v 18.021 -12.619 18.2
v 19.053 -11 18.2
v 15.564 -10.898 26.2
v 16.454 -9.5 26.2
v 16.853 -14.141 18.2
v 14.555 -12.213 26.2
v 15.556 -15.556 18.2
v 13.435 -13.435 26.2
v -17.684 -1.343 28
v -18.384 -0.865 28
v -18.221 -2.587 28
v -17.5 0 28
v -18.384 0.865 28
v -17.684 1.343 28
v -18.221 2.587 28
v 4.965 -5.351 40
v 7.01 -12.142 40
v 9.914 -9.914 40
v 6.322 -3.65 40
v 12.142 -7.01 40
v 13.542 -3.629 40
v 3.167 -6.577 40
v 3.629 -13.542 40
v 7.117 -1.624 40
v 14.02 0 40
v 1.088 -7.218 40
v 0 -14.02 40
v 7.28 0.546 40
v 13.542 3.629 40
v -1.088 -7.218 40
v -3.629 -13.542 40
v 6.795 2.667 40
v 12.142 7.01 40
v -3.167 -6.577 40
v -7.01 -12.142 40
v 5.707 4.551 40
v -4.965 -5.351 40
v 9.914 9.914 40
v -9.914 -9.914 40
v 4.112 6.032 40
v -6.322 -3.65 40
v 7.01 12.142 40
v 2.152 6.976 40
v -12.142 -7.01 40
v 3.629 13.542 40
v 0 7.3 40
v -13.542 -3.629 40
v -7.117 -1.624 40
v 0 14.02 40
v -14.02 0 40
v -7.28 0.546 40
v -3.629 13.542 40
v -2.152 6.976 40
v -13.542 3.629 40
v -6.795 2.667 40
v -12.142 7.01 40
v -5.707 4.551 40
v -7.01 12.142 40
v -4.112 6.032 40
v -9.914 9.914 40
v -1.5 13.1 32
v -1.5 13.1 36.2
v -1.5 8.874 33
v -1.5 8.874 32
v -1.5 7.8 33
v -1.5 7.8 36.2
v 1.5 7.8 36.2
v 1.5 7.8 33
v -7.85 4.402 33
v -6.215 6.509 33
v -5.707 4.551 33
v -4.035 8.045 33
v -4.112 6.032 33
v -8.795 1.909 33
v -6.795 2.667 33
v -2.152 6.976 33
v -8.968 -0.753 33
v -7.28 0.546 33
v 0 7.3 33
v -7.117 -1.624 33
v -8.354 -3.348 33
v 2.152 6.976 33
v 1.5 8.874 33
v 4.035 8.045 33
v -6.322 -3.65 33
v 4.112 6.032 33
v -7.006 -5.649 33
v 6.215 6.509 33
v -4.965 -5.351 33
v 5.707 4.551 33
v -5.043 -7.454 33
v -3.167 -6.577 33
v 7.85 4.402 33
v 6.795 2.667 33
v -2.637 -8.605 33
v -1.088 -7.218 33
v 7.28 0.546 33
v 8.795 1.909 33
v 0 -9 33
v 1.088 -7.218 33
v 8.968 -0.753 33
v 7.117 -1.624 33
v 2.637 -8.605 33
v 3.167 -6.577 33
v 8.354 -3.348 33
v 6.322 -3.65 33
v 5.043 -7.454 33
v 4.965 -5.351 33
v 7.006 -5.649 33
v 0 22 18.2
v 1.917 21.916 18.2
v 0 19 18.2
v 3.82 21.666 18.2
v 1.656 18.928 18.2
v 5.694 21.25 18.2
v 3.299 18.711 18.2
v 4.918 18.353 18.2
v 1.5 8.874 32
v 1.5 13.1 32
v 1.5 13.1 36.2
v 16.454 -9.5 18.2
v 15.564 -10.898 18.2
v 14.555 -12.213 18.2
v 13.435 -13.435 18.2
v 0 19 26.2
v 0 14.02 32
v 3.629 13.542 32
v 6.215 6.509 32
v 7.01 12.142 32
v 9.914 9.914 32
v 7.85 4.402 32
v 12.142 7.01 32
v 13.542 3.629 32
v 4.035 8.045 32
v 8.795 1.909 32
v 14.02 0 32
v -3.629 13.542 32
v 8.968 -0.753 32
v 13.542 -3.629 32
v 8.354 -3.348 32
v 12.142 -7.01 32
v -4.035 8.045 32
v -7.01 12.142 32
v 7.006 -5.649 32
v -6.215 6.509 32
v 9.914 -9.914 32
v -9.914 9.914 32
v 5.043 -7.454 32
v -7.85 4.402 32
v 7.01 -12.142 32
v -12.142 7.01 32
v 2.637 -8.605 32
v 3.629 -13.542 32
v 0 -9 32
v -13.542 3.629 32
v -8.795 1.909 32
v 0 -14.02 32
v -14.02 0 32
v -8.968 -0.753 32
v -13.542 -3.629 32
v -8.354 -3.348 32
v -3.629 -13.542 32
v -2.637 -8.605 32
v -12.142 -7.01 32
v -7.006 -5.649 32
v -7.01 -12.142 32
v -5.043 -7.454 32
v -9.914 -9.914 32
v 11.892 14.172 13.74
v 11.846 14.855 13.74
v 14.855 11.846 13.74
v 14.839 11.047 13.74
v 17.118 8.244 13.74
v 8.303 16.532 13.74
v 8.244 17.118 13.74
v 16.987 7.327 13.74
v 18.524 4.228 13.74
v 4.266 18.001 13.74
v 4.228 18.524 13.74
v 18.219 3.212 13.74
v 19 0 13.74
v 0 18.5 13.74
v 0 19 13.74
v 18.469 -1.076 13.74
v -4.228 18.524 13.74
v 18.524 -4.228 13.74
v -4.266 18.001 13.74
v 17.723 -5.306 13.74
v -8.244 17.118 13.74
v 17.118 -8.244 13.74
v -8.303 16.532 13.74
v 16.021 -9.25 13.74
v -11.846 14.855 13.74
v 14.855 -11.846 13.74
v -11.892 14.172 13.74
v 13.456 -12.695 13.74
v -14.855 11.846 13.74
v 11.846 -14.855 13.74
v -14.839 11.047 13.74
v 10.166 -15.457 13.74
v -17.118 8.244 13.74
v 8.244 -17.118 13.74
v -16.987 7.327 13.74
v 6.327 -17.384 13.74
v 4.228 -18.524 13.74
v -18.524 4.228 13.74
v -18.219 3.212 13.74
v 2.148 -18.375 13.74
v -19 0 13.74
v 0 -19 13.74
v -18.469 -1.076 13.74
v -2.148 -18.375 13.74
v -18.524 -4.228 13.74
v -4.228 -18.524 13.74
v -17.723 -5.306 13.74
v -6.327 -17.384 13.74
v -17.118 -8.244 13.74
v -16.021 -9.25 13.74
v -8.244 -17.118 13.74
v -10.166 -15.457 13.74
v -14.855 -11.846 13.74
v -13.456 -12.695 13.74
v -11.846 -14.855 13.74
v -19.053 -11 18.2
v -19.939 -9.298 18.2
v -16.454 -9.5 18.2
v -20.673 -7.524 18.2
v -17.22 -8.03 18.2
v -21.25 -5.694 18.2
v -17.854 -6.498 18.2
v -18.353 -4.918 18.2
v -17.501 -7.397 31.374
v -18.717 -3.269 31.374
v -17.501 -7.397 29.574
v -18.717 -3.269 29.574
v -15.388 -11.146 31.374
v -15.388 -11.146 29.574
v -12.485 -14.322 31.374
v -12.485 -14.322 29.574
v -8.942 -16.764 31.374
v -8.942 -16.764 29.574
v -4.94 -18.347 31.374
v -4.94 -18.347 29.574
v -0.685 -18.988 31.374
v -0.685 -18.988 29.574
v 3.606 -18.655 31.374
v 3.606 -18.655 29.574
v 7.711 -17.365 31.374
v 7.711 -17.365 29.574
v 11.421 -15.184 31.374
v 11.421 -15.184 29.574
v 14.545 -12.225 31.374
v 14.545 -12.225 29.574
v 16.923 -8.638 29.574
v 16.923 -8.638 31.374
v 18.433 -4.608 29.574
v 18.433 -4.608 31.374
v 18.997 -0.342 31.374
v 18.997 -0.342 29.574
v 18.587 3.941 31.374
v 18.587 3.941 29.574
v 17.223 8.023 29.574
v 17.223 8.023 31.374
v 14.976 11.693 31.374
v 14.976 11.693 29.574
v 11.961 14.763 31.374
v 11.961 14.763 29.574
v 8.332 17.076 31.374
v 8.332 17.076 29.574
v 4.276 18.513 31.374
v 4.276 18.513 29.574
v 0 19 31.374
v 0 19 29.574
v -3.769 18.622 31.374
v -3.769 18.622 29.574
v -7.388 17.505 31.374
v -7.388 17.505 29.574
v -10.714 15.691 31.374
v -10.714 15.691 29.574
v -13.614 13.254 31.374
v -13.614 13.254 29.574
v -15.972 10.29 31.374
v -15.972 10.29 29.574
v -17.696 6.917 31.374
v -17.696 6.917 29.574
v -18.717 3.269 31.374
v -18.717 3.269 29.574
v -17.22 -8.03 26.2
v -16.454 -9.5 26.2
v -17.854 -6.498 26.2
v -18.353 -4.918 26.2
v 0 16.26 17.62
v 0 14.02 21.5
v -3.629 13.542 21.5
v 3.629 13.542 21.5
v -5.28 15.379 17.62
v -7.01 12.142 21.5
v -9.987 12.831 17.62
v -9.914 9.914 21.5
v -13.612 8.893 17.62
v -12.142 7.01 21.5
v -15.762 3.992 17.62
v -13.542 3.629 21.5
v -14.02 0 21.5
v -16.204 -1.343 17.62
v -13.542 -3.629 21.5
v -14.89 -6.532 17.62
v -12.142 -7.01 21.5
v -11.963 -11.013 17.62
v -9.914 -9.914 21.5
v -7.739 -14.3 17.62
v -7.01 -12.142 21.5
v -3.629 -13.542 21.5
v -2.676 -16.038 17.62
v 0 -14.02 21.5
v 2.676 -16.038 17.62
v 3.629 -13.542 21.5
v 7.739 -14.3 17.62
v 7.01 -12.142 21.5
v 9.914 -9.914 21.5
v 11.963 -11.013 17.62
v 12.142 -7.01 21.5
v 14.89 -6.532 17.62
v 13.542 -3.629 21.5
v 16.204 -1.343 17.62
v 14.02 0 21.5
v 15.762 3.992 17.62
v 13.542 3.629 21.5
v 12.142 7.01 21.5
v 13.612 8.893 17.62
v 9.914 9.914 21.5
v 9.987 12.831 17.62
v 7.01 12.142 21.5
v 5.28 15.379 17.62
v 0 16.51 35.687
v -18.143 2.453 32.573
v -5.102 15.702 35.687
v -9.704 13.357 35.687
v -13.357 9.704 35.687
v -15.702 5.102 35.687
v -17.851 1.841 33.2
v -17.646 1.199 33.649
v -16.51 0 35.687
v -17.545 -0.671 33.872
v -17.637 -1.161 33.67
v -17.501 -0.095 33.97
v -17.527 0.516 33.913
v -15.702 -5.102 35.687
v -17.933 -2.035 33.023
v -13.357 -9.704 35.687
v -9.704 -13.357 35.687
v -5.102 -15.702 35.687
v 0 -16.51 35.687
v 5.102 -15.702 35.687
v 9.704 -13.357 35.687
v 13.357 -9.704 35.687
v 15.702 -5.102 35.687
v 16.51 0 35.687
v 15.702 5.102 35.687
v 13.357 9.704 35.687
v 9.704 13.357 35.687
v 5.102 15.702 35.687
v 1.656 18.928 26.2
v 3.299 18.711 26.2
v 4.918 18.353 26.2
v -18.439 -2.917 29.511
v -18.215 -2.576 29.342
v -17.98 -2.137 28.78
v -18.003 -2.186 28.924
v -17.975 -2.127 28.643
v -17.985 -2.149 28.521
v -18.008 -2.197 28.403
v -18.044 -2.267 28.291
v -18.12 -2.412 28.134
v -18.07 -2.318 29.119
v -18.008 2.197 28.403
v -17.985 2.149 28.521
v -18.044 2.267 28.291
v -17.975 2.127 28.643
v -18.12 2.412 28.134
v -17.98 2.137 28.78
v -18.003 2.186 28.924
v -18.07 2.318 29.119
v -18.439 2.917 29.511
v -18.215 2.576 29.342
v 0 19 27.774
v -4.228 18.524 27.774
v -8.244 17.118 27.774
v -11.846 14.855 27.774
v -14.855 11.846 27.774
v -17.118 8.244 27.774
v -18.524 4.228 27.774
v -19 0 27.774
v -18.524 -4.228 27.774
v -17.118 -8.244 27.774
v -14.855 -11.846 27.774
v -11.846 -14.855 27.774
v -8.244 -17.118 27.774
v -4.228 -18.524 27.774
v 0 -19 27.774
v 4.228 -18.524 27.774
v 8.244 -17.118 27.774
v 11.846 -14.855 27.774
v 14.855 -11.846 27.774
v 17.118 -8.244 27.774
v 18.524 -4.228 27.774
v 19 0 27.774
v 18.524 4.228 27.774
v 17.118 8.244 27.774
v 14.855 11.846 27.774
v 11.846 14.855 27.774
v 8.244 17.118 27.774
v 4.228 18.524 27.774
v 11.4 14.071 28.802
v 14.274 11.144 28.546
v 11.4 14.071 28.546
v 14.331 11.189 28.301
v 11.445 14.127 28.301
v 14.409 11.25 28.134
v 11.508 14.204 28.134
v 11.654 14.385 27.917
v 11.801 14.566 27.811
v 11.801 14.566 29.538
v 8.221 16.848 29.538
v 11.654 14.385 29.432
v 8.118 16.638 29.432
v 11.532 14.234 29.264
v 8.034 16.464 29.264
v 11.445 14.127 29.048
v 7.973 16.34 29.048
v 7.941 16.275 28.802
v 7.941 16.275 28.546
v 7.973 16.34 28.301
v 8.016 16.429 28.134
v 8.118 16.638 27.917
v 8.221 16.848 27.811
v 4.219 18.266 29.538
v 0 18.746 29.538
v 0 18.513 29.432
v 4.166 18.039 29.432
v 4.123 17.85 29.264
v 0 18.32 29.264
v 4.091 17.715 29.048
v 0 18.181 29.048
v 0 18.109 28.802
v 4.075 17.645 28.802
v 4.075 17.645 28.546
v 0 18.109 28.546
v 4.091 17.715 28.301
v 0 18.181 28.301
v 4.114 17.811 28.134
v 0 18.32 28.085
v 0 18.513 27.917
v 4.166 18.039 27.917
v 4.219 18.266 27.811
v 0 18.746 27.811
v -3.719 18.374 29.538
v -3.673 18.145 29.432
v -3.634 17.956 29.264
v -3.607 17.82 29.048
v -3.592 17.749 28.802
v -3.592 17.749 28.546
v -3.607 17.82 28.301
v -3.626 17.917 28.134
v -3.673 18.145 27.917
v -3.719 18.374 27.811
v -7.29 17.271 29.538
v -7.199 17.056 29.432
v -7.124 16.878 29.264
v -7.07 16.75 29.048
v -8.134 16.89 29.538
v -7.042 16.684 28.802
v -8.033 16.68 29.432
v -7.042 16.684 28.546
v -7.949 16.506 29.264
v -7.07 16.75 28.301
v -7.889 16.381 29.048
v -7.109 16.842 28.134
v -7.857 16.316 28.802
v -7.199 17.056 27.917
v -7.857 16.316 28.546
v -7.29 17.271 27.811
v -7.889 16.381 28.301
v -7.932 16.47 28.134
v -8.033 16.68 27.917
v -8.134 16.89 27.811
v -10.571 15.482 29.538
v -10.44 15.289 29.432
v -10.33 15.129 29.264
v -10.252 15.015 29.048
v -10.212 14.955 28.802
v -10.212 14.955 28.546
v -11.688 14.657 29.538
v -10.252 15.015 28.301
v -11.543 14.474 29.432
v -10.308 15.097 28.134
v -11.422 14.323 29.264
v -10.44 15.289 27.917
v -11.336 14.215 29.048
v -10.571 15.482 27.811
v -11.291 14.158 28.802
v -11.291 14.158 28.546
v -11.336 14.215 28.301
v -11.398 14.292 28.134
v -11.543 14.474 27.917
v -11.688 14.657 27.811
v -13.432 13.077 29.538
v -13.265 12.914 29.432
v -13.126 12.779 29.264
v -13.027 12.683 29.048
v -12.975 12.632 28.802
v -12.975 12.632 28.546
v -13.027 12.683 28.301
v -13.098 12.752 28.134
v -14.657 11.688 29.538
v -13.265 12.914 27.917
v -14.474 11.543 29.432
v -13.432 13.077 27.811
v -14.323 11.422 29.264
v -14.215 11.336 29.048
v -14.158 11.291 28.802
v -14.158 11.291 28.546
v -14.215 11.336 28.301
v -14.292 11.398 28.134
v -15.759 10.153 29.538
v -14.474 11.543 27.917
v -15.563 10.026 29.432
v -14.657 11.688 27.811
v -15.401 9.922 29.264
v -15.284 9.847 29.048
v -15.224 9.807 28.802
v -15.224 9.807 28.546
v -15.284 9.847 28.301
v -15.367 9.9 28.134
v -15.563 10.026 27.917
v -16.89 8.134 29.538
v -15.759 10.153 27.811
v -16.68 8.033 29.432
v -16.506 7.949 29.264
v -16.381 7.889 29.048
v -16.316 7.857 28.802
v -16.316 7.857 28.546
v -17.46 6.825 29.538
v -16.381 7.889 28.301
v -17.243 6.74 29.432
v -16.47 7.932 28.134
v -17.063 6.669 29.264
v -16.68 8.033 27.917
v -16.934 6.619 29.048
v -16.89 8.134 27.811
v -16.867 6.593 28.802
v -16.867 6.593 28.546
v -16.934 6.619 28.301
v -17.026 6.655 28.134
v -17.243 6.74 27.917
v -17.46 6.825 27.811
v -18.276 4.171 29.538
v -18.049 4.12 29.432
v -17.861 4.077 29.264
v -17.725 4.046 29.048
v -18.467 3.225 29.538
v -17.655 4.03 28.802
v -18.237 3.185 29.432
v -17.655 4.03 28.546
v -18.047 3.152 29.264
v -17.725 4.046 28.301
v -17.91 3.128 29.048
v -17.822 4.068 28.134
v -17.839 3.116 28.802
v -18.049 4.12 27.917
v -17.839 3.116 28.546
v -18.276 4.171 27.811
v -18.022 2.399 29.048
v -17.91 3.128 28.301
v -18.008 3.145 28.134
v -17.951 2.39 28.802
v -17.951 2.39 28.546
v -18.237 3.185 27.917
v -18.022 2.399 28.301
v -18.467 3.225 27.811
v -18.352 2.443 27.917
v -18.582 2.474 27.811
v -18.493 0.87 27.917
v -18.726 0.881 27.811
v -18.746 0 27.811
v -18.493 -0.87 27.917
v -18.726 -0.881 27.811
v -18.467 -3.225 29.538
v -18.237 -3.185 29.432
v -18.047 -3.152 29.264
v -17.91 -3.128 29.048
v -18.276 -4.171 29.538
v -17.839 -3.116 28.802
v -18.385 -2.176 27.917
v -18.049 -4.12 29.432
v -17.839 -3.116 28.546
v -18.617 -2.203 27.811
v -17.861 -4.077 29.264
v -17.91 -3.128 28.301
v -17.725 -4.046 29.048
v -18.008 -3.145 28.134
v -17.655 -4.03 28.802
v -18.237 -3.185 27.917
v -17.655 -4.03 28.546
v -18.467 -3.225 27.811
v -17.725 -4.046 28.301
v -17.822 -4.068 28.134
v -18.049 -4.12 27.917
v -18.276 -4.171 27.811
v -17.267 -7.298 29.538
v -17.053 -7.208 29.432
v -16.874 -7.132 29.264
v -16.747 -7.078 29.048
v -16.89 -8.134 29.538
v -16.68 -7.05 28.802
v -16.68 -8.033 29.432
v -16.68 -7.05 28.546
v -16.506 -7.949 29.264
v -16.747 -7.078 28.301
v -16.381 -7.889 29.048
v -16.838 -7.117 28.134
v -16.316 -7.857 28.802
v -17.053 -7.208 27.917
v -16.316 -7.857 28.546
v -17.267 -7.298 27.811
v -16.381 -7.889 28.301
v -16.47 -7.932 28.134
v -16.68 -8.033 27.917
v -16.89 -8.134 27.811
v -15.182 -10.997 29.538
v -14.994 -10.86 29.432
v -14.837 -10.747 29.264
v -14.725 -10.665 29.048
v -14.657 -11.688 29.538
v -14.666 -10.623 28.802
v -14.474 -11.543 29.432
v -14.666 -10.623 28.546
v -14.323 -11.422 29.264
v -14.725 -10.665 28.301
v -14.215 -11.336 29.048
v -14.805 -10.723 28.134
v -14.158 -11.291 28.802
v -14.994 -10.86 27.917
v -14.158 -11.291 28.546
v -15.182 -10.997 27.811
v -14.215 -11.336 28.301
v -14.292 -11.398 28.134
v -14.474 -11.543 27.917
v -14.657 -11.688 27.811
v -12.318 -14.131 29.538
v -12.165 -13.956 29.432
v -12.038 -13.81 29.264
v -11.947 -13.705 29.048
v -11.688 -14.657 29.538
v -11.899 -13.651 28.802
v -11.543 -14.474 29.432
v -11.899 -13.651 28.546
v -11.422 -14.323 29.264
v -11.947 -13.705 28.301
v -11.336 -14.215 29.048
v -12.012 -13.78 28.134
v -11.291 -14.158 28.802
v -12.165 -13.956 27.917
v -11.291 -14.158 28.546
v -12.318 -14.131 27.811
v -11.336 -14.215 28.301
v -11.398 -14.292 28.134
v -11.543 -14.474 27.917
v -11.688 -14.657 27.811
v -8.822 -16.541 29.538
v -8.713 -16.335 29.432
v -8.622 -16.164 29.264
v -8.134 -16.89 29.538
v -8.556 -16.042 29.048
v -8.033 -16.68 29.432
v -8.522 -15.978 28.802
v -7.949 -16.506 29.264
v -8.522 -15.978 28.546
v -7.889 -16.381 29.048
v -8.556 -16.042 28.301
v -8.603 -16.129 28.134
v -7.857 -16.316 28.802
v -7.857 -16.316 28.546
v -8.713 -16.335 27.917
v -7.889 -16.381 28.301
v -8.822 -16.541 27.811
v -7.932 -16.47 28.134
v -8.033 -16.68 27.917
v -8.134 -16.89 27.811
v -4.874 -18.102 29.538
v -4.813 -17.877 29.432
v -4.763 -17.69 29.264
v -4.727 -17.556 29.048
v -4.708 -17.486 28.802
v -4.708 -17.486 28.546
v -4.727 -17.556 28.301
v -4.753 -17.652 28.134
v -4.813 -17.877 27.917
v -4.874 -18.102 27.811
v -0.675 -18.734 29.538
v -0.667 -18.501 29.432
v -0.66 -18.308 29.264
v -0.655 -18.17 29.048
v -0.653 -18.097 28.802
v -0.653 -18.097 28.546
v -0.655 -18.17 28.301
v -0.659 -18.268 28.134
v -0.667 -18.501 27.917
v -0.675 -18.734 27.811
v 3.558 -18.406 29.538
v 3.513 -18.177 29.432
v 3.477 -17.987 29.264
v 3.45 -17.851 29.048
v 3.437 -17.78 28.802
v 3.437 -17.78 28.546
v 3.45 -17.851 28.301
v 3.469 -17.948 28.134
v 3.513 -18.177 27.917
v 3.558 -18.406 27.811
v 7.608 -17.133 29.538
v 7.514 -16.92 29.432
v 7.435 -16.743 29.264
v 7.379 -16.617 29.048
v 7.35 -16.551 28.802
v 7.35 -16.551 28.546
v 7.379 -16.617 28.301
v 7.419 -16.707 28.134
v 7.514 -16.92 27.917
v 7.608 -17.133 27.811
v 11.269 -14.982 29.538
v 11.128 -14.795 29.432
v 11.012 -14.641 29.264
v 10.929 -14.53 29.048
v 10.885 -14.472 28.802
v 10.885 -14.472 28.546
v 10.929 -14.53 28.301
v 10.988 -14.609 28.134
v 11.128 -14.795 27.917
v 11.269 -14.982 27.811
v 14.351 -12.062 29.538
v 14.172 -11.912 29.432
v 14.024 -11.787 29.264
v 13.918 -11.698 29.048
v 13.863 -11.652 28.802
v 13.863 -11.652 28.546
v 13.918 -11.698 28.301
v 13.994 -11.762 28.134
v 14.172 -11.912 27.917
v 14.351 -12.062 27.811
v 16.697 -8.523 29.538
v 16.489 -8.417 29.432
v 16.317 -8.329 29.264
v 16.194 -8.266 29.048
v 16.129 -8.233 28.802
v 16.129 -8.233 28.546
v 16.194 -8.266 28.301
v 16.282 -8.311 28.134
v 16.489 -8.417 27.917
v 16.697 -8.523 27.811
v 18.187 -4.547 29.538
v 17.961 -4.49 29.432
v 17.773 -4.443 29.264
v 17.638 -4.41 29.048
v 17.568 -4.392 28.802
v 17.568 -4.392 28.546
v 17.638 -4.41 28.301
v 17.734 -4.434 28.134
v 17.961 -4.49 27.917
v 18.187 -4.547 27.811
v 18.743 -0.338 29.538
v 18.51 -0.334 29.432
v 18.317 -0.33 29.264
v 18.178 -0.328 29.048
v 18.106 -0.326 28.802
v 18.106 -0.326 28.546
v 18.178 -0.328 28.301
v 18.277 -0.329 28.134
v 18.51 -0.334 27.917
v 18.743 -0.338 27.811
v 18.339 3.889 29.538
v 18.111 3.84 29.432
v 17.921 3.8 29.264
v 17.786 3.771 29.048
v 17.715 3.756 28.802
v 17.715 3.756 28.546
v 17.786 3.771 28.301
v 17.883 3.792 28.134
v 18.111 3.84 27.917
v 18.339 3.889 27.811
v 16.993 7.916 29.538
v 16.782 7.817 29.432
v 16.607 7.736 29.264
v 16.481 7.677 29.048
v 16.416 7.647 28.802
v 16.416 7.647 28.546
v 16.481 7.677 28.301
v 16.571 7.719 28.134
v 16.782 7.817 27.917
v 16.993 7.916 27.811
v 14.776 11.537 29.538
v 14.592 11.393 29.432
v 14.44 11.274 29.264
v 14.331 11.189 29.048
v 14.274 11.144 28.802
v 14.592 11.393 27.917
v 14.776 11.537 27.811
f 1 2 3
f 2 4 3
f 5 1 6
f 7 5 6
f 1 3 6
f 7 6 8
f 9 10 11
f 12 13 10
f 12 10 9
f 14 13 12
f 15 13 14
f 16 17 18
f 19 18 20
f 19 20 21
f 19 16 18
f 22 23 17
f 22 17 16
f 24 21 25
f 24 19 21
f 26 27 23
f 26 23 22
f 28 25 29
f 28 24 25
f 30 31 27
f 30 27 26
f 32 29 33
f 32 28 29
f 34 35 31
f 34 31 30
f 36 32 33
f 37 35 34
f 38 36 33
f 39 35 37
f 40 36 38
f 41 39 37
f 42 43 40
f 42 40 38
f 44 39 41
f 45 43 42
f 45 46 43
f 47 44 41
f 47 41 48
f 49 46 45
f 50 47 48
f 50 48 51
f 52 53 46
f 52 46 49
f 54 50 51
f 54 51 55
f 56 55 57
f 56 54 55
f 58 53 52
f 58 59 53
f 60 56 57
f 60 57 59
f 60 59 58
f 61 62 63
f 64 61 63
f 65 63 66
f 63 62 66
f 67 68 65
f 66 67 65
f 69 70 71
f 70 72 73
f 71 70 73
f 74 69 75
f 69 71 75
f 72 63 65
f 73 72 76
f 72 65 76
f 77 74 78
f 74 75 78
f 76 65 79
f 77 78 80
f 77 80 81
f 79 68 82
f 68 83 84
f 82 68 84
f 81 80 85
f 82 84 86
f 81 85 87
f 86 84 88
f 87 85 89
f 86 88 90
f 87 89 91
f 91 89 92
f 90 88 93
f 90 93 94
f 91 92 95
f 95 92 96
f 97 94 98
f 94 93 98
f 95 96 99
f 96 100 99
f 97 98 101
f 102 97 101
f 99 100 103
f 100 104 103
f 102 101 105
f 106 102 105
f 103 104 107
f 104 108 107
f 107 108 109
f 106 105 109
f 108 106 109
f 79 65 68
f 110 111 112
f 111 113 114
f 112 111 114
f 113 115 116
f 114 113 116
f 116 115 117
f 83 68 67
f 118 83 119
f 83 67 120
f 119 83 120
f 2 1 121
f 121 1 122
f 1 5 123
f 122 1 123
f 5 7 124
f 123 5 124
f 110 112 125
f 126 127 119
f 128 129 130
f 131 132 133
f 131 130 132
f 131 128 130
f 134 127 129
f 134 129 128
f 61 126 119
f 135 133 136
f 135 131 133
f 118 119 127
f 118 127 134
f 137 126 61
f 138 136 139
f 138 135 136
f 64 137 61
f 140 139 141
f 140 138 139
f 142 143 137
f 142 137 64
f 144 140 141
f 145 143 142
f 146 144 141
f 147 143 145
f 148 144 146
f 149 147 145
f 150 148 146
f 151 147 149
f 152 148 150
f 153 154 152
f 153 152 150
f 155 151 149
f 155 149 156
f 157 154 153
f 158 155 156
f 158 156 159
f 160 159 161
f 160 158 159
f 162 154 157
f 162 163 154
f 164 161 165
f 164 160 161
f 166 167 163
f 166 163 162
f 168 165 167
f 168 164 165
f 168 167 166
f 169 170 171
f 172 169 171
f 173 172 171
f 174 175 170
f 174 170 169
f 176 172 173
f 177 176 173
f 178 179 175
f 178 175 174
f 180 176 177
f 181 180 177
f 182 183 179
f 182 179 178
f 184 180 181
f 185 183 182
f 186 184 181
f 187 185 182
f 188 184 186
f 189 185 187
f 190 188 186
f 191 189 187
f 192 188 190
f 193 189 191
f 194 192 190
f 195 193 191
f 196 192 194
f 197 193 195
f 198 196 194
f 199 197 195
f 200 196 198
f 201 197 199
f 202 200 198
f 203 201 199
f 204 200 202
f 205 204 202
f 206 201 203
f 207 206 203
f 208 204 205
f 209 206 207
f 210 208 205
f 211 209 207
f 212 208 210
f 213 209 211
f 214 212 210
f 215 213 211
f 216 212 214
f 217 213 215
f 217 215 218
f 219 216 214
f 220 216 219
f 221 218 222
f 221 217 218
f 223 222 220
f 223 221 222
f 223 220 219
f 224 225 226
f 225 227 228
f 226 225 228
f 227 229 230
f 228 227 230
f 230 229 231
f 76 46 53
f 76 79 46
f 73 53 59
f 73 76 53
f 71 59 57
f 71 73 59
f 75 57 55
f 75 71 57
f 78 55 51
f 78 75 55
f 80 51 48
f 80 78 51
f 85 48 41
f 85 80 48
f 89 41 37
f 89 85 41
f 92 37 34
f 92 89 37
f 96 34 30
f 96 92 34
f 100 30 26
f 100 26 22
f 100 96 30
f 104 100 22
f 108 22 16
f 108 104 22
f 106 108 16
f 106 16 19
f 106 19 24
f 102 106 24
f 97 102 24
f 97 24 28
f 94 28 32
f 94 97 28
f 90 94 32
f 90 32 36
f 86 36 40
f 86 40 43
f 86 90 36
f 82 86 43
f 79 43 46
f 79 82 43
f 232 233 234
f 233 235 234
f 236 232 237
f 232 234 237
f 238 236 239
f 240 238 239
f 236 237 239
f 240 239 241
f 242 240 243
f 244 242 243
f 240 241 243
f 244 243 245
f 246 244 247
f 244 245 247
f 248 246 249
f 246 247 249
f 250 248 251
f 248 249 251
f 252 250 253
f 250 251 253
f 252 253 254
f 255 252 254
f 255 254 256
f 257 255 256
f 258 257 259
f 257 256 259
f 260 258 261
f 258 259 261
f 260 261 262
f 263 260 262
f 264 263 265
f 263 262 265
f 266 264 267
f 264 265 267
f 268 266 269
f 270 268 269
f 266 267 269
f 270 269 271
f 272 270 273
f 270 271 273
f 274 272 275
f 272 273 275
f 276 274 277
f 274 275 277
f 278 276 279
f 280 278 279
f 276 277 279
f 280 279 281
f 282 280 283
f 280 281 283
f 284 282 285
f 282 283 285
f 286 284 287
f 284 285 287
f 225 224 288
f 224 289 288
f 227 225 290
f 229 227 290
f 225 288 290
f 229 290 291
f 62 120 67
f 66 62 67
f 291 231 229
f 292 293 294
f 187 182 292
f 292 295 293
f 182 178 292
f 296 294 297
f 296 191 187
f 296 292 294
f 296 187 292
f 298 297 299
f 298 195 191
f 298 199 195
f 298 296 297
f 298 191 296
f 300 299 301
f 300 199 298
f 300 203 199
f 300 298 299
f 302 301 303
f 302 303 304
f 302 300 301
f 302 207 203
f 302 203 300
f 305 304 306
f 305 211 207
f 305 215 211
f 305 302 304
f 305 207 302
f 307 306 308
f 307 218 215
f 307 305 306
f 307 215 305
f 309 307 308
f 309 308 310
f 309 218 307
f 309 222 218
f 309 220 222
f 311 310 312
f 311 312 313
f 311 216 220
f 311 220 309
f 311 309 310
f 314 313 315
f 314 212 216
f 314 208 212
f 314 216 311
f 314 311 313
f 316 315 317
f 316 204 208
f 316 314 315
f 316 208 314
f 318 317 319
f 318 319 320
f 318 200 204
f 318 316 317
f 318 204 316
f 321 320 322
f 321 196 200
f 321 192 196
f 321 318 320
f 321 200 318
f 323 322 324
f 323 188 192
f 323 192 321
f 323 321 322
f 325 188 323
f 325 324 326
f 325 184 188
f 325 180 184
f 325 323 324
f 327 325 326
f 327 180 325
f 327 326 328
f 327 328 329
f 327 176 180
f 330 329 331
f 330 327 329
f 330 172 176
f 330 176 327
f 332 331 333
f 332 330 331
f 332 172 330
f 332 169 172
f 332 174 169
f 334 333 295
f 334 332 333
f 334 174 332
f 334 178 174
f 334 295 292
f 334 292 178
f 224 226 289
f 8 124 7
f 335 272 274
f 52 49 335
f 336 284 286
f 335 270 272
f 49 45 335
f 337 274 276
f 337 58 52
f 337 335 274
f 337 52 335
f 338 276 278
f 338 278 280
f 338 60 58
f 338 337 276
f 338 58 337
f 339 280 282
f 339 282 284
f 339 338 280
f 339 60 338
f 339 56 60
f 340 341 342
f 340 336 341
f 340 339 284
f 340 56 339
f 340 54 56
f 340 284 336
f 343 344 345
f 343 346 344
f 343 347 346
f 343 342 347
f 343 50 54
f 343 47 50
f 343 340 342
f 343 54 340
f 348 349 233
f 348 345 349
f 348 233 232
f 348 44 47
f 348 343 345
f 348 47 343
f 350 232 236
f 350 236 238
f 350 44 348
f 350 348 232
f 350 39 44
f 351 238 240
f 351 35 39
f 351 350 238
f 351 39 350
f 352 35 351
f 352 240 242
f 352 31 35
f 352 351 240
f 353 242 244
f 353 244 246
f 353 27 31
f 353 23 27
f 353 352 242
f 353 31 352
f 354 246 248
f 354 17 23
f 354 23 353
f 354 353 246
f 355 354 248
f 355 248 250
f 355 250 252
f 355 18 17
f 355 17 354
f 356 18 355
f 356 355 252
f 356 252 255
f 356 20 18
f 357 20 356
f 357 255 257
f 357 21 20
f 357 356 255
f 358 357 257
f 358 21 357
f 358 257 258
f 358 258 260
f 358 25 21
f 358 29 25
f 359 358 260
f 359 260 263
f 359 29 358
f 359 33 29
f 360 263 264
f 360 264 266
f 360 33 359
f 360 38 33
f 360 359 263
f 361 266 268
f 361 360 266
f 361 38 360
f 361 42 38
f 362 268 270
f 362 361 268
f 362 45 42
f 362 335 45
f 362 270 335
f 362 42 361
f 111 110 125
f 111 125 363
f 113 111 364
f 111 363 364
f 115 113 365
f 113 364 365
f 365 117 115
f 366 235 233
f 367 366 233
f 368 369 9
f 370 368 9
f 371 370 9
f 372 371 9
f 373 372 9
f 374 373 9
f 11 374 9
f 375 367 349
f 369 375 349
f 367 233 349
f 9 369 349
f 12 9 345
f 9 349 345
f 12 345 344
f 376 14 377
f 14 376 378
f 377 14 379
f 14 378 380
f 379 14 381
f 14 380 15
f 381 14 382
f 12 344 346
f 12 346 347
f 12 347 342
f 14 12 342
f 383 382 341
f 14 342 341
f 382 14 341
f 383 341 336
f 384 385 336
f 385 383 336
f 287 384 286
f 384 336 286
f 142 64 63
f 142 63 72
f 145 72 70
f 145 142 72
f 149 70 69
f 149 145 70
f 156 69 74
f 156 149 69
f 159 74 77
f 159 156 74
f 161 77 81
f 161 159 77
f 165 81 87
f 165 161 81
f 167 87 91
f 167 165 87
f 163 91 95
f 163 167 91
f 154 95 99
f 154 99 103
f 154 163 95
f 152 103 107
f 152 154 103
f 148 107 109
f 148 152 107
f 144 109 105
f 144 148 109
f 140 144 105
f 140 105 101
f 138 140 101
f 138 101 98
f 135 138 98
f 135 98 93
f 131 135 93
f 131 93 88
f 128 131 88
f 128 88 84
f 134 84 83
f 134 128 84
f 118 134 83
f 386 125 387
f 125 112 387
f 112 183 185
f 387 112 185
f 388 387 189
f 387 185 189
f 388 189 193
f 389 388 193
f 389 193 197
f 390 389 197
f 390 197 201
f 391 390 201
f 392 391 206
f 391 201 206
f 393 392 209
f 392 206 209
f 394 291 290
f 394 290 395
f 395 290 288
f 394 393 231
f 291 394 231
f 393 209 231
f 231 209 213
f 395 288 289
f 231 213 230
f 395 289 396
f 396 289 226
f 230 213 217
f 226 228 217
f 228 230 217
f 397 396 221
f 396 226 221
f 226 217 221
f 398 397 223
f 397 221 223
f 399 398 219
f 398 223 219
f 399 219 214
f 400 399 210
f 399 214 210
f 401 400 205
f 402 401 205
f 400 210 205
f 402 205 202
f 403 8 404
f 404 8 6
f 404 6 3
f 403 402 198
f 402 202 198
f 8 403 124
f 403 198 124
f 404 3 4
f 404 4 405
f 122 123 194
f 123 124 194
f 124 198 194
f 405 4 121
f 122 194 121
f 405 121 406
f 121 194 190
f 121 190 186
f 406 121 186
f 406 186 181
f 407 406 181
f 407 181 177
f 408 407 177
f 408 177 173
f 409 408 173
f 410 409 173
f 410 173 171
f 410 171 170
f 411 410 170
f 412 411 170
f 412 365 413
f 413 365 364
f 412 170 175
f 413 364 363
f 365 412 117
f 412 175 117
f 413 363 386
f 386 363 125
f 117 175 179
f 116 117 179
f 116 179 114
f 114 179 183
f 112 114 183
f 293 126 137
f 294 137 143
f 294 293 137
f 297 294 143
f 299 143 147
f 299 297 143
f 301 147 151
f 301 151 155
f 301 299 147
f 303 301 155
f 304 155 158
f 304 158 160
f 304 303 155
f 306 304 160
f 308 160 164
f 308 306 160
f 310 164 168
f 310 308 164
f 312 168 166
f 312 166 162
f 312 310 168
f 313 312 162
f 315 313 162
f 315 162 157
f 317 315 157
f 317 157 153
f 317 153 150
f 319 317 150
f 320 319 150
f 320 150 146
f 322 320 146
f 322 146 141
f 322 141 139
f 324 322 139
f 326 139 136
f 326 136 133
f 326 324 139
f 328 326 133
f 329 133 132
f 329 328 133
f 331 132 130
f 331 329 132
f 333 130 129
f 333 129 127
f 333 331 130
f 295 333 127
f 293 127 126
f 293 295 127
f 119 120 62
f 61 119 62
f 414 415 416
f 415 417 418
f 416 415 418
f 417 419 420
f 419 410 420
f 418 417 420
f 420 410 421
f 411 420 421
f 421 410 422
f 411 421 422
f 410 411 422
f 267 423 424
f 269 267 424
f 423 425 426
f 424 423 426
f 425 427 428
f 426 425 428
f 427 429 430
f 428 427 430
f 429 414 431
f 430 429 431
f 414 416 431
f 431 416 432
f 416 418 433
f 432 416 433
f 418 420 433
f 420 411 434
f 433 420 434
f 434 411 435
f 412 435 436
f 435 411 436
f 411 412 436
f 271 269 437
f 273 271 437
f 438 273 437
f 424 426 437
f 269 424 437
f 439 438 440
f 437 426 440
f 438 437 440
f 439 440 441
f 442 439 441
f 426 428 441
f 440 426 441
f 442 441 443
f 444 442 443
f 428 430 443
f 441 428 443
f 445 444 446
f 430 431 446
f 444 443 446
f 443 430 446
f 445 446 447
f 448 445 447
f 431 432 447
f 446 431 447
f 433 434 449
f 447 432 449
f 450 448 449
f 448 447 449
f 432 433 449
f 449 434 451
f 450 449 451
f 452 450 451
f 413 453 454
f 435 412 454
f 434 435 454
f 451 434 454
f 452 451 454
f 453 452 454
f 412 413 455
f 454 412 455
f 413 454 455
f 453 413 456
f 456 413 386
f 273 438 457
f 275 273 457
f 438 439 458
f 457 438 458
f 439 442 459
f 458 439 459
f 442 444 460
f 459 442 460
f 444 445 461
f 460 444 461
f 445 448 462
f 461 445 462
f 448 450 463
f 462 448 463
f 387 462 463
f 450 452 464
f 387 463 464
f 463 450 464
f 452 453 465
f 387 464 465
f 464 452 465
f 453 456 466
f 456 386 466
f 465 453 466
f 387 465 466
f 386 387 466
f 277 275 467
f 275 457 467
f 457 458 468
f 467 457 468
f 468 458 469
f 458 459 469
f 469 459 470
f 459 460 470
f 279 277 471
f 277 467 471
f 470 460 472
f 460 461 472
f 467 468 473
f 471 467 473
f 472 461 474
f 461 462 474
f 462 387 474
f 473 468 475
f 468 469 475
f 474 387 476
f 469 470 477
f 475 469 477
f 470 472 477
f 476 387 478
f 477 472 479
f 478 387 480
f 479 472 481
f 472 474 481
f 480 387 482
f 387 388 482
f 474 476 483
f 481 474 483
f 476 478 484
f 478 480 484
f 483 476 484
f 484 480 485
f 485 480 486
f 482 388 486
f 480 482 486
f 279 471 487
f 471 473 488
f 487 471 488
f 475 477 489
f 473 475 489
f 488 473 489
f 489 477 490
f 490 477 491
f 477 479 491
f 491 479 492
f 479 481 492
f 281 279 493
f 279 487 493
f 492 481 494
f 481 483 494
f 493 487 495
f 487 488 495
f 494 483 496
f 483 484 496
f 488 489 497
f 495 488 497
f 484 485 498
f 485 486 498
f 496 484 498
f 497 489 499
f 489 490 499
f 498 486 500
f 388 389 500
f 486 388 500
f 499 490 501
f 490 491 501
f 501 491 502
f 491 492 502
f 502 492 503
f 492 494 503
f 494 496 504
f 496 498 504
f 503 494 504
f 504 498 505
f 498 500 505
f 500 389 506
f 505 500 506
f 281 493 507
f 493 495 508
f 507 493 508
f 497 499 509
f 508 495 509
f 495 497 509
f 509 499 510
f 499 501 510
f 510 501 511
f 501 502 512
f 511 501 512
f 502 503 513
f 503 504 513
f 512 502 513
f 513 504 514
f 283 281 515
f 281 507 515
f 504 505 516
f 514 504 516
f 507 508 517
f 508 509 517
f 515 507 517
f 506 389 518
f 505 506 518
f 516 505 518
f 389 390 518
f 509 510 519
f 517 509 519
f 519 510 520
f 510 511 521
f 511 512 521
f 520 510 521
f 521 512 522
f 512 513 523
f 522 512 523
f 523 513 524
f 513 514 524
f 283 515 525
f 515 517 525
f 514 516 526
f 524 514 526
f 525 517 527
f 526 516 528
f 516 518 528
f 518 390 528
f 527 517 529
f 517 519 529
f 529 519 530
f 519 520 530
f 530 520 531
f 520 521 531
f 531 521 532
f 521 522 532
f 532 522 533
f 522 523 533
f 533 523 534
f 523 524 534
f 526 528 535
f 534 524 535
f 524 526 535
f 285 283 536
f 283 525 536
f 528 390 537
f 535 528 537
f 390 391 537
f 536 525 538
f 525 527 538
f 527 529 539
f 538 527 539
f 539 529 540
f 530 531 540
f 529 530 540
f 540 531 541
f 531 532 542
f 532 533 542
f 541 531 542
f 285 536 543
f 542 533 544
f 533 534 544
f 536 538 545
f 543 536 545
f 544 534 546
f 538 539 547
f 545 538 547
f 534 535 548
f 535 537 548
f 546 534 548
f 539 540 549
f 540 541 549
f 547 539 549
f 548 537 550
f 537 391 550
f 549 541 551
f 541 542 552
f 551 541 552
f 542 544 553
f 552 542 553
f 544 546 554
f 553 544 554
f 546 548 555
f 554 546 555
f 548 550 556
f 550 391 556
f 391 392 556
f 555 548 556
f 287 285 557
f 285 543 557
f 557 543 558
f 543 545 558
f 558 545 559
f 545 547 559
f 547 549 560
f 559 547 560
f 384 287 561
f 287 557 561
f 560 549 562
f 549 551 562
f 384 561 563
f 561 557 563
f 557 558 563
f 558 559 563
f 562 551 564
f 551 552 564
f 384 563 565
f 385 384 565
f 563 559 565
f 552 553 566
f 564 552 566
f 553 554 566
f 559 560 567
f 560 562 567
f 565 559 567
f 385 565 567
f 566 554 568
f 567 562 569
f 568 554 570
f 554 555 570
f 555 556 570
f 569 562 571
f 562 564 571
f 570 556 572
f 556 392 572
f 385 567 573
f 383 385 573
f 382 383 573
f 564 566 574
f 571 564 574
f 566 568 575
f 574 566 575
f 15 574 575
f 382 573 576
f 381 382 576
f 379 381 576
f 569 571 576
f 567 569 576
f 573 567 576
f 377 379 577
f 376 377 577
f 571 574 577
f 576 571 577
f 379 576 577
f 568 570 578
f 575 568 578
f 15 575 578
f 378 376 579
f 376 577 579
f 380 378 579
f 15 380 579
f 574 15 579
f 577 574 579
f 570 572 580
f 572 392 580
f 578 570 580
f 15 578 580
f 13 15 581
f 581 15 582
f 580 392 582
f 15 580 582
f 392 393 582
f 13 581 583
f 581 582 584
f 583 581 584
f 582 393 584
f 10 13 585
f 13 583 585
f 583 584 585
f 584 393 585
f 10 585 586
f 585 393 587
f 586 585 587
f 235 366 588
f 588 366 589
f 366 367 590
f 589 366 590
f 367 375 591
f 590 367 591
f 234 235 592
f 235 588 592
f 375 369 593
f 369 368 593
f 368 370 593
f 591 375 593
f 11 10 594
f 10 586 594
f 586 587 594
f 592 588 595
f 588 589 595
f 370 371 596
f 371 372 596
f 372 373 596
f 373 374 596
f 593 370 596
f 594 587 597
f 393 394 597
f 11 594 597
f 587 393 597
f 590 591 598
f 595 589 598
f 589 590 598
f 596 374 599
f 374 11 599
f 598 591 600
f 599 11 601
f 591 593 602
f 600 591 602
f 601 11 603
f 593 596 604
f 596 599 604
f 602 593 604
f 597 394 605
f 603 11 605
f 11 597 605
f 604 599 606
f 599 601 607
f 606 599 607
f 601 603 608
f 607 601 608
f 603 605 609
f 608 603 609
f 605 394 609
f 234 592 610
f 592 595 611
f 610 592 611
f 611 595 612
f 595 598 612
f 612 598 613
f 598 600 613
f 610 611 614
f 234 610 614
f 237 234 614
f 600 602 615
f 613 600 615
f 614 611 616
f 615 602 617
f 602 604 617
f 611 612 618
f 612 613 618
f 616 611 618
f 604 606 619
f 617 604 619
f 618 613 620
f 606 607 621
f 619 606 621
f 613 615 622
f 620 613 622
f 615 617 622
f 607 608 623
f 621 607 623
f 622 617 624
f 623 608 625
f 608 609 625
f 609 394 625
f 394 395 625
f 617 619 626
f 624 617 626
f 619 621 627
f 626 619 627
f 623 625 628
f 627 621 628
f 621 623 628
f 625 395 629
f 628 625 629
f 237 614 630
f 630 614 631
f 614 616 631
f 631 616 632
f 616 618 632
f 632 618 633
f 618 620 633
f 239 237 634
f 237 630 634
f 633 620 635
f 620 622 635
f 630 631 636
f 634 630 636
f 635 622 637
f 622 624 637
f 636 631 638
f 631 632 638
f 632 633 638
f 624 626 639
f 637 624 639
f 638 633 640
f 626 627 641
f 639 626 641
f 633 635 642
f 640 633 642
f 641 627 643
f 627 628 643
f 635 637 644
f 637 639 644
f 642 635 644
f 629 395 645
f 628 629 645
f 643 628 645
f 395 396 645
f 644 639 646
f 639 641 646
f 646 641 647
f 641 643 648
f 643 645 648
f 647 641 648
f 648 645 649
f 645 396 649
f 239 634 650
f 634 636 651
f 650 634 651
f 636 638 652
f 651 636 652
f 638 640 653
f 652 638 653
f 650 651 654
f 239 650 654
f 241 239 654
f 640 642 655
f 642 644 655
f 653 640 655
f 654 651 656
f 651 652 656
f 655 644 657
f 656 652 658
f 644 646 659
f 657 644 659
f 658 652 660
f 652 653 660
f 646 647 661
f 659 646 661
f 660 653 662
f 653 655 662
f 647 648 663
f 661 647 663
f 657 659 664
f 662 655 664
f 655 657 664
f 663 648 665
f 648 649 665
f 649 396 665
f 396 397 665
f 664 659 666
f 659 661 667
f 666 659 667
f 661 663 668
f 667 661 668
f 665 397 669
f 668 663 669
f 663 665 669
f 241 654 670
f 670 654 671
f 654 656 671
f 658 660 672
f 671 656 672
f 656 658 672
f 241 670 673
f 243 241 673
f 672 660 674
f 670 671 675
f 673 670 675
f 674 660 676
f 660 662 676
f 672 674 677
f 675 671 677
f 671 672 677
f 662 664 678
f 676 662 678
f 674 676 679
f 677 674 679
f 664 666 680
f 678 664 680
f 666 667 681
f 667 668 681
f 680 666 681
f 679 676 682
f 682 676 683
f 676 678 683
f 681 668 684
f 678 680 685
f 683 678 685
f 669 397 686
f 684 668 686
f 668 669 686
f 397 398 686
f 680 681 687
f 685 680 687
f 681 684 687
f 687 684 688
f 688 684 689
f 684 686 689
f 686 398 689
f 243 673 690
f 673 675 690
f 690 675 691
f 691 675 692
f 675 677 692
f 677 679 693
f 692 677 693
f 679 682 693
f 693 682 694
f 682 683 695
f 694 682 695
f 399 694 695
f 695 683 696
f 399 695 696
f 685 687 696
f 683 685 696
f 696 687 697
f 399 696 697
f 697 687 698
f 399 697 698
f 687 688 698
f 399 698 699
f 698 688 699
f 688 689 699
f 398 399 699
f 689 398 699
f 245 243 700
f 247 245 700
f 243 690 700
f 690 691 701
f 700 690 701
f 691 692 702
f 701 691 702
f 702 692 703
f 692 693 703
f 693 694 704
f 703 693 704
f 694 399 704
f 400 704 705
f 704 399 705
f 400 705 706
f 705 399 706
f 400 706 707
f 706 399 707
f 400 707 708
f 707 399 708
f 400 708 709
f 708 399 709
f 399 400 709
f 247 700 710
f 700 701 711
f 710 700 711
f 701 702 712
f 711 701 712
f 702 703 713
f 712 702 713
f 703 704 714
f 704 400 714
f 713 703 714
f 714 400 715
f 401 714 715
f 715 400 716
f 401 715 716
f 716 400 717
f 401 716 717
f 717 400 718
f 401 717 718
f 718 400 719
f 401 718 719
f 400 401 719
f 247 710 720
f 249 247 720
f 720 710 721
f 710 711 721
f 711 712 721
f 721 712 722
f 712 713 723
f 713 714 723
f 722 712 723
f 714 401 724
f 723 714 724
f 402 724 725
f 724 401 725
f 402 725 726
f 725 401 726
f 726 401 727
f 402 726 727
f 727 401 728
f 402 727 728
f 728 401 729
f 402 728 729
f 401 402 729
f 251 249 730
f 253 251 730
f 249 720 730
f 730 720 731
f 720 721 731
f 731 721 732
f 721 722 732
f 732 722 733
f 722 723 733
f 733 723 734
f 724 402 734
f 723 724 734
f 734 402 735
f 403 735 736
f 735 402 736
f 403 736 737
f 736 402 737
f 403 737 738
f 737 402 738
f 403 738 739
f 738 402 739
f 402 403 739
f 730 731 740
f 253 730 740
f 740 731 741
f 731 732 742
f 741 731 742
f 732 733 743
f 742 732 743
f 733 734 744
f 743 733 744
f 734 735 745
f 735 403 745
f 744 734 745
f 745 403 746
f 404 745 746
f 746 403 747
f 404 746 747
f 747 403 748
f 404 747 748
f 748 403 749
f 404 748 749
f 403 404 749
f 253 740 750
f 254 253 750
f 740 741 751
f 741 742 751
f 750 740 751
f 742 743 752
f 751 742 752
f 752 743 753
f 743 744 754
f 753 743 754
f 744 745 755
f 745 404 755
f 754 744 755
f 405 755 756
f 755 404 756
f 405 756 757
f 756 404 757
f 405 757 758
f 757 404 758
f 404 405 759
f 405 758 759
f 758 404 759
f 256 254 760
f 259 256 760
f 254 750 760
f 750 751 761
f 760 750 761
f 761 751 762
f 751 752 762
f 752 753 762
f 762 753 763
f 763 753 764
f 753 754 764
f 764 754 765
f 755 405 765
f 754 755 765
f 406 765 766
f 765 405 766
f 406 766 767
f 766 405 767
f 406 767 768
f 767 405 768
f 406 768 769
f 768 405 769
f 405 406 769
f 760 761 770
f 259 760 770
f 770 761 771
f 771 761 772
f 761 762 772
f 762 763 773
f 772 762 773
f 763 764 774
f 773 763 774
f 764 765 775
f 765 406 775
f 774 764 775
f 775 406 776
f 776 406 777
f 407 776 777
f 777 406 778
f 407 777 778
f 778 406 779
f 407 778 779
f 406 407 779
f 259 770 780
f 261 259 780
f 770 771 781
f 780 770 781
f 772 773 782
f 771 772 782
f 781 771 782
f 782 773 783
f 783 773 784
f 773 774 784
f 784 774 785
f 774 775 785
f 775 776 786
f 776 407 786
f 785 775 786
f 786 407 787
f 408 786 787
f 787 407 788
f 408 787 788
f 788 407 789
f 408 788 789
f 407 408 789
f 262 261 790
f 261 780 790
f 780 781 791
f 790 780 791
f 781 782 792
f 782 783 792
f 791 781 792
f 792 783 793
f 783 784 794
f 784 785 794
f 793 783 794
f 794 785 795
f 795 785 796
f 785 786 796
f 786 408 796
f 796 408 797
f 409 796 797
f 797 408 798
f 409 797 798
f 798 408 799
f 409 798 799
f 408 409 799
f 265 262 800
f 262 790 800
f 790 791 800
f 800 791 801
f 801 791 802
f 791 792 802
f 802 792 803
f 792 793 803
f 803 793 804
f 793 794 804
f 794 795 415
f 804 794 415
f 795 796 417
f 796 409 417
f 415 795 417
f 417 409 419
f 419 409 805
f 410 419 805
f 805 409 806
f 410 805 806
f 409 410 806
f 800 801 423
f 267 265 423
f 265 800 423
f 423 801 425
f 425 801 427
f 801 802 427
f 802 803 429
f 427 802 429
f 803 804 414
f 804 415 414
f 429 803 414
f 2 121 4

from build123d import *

# Parameters (mm, degrees)
REVOLUTION012_ANGLE = -15
REVOLUTION013_ANGLE = -15
REVOLUTION014_ANGLE = -15
POCKET_DEPTH        = 5
POCKET_DEPTH_BACK   = 3.2
SKETCH139_R         = 5
POCKET046_DEPTH     = 12


with BuildPart() as part:
    # Sketch031 → Revolution010 (revolve)
    with BuildSketch(Plane.YZ):
        with BuildLine():
            Line((14.02, -8), (14.02, -18.5))
            Line((14.02, -18.5), (18.5, -26.259588))
            Line((18.5, -26.259588), (19, -26.259588))
            Line((19, -12.225613), (19, -26.259588))
            ThreePointArc((19, -10.425613), (18.1, -11.325613), (19, -12.225613))
            Line((19, -8.625613), (19, -10.425613))
            Line((19, -8.625613), (14.02, 0))
            Line((14.02, 0), (7.3, 0))
            Line((7.3, 0), (7.3, -7))
            Line((7.3, -7), (9, -7))
            Line((9, -7), (9, -8))
            Line((9, -8), (14.02, -8))
        make_face()
    revolve(axis=Axis((0, 0, 0), (0, 0, 1)))

    # Sketch036 → Revolution012 (revolve)
    with BuildSketch(Plane.YZ):
        Polygon((19, -13.8), (19, -21.8), (22, -21.8), align=None)
    revolve(axis=Axis((0, 0, 0), (0, 0, 1)), revolution_arc=REVOLUTION012_ANGLE)

    # Sketch037 (on DatumPlane) → Revolution013 (revolve)
    with BuildSketch(Plane(origin=(0, 0, 0), x_dir=(-0.866025, -0.5, 0), z_dir=(-0.5, 0.866025, 0))):
        Polygon((19, -13.8), (19, -21.8), (22, -21.8), align=None)
    revolve(axis=Axis((0, 0, 0), (0, 0, 1)), revolution_arc=REVOLUTION013_ANGLE)

    # Sketch038 (on DatumPlane) → Revolution014 (revolve)
    with BuildSketch(Plane(origin=(0, 0, 0), x_dir=(0.866025, -0.5, 0), z_dir=(-0.5, -0.866025, 0))):
        Polygon((19, -13.8), (19, -21.8), (22, -21.8), align=None)
    revolve(axis=Axis((0, 0, 0), (0, 0, 1)), revolution_arc=REVOLUTION014_ANGLE)

    # Sketch062 (on Face24 of Revolution014) → Pocket (cut, two sides)
    with BuildSketch(Plane.YX.offset(7)) as pocket_sk:
        Polygon((7.8, 0), (7.8, 1.5), (13.1, 1.5), (13.1, -1.5), (7.8, -1.5), align=None)
    extrude(amount=POCKET_DEPTH, mode=Mode.SUBTRACT)
    extrude(pocket_sk.sketch, amount=-POCKET_DEPTH_BACK, mode=Mode.SUBTRACT)

    # Sketch139 → Pocket046 (cut)
    with BuildSketch(Plane.XY):
        with Locations((-22.5, 0)):
            Circle(SKETCH139_R)
    extrude(amount=-POCKET046_DEPTH, mode=Mode.SUBTRACT)


with BuildPart() as part_1:
    # Body008 placement: moved
    add(part.part.moved(Location((0, 0, 40))))


solid = part_1.part
